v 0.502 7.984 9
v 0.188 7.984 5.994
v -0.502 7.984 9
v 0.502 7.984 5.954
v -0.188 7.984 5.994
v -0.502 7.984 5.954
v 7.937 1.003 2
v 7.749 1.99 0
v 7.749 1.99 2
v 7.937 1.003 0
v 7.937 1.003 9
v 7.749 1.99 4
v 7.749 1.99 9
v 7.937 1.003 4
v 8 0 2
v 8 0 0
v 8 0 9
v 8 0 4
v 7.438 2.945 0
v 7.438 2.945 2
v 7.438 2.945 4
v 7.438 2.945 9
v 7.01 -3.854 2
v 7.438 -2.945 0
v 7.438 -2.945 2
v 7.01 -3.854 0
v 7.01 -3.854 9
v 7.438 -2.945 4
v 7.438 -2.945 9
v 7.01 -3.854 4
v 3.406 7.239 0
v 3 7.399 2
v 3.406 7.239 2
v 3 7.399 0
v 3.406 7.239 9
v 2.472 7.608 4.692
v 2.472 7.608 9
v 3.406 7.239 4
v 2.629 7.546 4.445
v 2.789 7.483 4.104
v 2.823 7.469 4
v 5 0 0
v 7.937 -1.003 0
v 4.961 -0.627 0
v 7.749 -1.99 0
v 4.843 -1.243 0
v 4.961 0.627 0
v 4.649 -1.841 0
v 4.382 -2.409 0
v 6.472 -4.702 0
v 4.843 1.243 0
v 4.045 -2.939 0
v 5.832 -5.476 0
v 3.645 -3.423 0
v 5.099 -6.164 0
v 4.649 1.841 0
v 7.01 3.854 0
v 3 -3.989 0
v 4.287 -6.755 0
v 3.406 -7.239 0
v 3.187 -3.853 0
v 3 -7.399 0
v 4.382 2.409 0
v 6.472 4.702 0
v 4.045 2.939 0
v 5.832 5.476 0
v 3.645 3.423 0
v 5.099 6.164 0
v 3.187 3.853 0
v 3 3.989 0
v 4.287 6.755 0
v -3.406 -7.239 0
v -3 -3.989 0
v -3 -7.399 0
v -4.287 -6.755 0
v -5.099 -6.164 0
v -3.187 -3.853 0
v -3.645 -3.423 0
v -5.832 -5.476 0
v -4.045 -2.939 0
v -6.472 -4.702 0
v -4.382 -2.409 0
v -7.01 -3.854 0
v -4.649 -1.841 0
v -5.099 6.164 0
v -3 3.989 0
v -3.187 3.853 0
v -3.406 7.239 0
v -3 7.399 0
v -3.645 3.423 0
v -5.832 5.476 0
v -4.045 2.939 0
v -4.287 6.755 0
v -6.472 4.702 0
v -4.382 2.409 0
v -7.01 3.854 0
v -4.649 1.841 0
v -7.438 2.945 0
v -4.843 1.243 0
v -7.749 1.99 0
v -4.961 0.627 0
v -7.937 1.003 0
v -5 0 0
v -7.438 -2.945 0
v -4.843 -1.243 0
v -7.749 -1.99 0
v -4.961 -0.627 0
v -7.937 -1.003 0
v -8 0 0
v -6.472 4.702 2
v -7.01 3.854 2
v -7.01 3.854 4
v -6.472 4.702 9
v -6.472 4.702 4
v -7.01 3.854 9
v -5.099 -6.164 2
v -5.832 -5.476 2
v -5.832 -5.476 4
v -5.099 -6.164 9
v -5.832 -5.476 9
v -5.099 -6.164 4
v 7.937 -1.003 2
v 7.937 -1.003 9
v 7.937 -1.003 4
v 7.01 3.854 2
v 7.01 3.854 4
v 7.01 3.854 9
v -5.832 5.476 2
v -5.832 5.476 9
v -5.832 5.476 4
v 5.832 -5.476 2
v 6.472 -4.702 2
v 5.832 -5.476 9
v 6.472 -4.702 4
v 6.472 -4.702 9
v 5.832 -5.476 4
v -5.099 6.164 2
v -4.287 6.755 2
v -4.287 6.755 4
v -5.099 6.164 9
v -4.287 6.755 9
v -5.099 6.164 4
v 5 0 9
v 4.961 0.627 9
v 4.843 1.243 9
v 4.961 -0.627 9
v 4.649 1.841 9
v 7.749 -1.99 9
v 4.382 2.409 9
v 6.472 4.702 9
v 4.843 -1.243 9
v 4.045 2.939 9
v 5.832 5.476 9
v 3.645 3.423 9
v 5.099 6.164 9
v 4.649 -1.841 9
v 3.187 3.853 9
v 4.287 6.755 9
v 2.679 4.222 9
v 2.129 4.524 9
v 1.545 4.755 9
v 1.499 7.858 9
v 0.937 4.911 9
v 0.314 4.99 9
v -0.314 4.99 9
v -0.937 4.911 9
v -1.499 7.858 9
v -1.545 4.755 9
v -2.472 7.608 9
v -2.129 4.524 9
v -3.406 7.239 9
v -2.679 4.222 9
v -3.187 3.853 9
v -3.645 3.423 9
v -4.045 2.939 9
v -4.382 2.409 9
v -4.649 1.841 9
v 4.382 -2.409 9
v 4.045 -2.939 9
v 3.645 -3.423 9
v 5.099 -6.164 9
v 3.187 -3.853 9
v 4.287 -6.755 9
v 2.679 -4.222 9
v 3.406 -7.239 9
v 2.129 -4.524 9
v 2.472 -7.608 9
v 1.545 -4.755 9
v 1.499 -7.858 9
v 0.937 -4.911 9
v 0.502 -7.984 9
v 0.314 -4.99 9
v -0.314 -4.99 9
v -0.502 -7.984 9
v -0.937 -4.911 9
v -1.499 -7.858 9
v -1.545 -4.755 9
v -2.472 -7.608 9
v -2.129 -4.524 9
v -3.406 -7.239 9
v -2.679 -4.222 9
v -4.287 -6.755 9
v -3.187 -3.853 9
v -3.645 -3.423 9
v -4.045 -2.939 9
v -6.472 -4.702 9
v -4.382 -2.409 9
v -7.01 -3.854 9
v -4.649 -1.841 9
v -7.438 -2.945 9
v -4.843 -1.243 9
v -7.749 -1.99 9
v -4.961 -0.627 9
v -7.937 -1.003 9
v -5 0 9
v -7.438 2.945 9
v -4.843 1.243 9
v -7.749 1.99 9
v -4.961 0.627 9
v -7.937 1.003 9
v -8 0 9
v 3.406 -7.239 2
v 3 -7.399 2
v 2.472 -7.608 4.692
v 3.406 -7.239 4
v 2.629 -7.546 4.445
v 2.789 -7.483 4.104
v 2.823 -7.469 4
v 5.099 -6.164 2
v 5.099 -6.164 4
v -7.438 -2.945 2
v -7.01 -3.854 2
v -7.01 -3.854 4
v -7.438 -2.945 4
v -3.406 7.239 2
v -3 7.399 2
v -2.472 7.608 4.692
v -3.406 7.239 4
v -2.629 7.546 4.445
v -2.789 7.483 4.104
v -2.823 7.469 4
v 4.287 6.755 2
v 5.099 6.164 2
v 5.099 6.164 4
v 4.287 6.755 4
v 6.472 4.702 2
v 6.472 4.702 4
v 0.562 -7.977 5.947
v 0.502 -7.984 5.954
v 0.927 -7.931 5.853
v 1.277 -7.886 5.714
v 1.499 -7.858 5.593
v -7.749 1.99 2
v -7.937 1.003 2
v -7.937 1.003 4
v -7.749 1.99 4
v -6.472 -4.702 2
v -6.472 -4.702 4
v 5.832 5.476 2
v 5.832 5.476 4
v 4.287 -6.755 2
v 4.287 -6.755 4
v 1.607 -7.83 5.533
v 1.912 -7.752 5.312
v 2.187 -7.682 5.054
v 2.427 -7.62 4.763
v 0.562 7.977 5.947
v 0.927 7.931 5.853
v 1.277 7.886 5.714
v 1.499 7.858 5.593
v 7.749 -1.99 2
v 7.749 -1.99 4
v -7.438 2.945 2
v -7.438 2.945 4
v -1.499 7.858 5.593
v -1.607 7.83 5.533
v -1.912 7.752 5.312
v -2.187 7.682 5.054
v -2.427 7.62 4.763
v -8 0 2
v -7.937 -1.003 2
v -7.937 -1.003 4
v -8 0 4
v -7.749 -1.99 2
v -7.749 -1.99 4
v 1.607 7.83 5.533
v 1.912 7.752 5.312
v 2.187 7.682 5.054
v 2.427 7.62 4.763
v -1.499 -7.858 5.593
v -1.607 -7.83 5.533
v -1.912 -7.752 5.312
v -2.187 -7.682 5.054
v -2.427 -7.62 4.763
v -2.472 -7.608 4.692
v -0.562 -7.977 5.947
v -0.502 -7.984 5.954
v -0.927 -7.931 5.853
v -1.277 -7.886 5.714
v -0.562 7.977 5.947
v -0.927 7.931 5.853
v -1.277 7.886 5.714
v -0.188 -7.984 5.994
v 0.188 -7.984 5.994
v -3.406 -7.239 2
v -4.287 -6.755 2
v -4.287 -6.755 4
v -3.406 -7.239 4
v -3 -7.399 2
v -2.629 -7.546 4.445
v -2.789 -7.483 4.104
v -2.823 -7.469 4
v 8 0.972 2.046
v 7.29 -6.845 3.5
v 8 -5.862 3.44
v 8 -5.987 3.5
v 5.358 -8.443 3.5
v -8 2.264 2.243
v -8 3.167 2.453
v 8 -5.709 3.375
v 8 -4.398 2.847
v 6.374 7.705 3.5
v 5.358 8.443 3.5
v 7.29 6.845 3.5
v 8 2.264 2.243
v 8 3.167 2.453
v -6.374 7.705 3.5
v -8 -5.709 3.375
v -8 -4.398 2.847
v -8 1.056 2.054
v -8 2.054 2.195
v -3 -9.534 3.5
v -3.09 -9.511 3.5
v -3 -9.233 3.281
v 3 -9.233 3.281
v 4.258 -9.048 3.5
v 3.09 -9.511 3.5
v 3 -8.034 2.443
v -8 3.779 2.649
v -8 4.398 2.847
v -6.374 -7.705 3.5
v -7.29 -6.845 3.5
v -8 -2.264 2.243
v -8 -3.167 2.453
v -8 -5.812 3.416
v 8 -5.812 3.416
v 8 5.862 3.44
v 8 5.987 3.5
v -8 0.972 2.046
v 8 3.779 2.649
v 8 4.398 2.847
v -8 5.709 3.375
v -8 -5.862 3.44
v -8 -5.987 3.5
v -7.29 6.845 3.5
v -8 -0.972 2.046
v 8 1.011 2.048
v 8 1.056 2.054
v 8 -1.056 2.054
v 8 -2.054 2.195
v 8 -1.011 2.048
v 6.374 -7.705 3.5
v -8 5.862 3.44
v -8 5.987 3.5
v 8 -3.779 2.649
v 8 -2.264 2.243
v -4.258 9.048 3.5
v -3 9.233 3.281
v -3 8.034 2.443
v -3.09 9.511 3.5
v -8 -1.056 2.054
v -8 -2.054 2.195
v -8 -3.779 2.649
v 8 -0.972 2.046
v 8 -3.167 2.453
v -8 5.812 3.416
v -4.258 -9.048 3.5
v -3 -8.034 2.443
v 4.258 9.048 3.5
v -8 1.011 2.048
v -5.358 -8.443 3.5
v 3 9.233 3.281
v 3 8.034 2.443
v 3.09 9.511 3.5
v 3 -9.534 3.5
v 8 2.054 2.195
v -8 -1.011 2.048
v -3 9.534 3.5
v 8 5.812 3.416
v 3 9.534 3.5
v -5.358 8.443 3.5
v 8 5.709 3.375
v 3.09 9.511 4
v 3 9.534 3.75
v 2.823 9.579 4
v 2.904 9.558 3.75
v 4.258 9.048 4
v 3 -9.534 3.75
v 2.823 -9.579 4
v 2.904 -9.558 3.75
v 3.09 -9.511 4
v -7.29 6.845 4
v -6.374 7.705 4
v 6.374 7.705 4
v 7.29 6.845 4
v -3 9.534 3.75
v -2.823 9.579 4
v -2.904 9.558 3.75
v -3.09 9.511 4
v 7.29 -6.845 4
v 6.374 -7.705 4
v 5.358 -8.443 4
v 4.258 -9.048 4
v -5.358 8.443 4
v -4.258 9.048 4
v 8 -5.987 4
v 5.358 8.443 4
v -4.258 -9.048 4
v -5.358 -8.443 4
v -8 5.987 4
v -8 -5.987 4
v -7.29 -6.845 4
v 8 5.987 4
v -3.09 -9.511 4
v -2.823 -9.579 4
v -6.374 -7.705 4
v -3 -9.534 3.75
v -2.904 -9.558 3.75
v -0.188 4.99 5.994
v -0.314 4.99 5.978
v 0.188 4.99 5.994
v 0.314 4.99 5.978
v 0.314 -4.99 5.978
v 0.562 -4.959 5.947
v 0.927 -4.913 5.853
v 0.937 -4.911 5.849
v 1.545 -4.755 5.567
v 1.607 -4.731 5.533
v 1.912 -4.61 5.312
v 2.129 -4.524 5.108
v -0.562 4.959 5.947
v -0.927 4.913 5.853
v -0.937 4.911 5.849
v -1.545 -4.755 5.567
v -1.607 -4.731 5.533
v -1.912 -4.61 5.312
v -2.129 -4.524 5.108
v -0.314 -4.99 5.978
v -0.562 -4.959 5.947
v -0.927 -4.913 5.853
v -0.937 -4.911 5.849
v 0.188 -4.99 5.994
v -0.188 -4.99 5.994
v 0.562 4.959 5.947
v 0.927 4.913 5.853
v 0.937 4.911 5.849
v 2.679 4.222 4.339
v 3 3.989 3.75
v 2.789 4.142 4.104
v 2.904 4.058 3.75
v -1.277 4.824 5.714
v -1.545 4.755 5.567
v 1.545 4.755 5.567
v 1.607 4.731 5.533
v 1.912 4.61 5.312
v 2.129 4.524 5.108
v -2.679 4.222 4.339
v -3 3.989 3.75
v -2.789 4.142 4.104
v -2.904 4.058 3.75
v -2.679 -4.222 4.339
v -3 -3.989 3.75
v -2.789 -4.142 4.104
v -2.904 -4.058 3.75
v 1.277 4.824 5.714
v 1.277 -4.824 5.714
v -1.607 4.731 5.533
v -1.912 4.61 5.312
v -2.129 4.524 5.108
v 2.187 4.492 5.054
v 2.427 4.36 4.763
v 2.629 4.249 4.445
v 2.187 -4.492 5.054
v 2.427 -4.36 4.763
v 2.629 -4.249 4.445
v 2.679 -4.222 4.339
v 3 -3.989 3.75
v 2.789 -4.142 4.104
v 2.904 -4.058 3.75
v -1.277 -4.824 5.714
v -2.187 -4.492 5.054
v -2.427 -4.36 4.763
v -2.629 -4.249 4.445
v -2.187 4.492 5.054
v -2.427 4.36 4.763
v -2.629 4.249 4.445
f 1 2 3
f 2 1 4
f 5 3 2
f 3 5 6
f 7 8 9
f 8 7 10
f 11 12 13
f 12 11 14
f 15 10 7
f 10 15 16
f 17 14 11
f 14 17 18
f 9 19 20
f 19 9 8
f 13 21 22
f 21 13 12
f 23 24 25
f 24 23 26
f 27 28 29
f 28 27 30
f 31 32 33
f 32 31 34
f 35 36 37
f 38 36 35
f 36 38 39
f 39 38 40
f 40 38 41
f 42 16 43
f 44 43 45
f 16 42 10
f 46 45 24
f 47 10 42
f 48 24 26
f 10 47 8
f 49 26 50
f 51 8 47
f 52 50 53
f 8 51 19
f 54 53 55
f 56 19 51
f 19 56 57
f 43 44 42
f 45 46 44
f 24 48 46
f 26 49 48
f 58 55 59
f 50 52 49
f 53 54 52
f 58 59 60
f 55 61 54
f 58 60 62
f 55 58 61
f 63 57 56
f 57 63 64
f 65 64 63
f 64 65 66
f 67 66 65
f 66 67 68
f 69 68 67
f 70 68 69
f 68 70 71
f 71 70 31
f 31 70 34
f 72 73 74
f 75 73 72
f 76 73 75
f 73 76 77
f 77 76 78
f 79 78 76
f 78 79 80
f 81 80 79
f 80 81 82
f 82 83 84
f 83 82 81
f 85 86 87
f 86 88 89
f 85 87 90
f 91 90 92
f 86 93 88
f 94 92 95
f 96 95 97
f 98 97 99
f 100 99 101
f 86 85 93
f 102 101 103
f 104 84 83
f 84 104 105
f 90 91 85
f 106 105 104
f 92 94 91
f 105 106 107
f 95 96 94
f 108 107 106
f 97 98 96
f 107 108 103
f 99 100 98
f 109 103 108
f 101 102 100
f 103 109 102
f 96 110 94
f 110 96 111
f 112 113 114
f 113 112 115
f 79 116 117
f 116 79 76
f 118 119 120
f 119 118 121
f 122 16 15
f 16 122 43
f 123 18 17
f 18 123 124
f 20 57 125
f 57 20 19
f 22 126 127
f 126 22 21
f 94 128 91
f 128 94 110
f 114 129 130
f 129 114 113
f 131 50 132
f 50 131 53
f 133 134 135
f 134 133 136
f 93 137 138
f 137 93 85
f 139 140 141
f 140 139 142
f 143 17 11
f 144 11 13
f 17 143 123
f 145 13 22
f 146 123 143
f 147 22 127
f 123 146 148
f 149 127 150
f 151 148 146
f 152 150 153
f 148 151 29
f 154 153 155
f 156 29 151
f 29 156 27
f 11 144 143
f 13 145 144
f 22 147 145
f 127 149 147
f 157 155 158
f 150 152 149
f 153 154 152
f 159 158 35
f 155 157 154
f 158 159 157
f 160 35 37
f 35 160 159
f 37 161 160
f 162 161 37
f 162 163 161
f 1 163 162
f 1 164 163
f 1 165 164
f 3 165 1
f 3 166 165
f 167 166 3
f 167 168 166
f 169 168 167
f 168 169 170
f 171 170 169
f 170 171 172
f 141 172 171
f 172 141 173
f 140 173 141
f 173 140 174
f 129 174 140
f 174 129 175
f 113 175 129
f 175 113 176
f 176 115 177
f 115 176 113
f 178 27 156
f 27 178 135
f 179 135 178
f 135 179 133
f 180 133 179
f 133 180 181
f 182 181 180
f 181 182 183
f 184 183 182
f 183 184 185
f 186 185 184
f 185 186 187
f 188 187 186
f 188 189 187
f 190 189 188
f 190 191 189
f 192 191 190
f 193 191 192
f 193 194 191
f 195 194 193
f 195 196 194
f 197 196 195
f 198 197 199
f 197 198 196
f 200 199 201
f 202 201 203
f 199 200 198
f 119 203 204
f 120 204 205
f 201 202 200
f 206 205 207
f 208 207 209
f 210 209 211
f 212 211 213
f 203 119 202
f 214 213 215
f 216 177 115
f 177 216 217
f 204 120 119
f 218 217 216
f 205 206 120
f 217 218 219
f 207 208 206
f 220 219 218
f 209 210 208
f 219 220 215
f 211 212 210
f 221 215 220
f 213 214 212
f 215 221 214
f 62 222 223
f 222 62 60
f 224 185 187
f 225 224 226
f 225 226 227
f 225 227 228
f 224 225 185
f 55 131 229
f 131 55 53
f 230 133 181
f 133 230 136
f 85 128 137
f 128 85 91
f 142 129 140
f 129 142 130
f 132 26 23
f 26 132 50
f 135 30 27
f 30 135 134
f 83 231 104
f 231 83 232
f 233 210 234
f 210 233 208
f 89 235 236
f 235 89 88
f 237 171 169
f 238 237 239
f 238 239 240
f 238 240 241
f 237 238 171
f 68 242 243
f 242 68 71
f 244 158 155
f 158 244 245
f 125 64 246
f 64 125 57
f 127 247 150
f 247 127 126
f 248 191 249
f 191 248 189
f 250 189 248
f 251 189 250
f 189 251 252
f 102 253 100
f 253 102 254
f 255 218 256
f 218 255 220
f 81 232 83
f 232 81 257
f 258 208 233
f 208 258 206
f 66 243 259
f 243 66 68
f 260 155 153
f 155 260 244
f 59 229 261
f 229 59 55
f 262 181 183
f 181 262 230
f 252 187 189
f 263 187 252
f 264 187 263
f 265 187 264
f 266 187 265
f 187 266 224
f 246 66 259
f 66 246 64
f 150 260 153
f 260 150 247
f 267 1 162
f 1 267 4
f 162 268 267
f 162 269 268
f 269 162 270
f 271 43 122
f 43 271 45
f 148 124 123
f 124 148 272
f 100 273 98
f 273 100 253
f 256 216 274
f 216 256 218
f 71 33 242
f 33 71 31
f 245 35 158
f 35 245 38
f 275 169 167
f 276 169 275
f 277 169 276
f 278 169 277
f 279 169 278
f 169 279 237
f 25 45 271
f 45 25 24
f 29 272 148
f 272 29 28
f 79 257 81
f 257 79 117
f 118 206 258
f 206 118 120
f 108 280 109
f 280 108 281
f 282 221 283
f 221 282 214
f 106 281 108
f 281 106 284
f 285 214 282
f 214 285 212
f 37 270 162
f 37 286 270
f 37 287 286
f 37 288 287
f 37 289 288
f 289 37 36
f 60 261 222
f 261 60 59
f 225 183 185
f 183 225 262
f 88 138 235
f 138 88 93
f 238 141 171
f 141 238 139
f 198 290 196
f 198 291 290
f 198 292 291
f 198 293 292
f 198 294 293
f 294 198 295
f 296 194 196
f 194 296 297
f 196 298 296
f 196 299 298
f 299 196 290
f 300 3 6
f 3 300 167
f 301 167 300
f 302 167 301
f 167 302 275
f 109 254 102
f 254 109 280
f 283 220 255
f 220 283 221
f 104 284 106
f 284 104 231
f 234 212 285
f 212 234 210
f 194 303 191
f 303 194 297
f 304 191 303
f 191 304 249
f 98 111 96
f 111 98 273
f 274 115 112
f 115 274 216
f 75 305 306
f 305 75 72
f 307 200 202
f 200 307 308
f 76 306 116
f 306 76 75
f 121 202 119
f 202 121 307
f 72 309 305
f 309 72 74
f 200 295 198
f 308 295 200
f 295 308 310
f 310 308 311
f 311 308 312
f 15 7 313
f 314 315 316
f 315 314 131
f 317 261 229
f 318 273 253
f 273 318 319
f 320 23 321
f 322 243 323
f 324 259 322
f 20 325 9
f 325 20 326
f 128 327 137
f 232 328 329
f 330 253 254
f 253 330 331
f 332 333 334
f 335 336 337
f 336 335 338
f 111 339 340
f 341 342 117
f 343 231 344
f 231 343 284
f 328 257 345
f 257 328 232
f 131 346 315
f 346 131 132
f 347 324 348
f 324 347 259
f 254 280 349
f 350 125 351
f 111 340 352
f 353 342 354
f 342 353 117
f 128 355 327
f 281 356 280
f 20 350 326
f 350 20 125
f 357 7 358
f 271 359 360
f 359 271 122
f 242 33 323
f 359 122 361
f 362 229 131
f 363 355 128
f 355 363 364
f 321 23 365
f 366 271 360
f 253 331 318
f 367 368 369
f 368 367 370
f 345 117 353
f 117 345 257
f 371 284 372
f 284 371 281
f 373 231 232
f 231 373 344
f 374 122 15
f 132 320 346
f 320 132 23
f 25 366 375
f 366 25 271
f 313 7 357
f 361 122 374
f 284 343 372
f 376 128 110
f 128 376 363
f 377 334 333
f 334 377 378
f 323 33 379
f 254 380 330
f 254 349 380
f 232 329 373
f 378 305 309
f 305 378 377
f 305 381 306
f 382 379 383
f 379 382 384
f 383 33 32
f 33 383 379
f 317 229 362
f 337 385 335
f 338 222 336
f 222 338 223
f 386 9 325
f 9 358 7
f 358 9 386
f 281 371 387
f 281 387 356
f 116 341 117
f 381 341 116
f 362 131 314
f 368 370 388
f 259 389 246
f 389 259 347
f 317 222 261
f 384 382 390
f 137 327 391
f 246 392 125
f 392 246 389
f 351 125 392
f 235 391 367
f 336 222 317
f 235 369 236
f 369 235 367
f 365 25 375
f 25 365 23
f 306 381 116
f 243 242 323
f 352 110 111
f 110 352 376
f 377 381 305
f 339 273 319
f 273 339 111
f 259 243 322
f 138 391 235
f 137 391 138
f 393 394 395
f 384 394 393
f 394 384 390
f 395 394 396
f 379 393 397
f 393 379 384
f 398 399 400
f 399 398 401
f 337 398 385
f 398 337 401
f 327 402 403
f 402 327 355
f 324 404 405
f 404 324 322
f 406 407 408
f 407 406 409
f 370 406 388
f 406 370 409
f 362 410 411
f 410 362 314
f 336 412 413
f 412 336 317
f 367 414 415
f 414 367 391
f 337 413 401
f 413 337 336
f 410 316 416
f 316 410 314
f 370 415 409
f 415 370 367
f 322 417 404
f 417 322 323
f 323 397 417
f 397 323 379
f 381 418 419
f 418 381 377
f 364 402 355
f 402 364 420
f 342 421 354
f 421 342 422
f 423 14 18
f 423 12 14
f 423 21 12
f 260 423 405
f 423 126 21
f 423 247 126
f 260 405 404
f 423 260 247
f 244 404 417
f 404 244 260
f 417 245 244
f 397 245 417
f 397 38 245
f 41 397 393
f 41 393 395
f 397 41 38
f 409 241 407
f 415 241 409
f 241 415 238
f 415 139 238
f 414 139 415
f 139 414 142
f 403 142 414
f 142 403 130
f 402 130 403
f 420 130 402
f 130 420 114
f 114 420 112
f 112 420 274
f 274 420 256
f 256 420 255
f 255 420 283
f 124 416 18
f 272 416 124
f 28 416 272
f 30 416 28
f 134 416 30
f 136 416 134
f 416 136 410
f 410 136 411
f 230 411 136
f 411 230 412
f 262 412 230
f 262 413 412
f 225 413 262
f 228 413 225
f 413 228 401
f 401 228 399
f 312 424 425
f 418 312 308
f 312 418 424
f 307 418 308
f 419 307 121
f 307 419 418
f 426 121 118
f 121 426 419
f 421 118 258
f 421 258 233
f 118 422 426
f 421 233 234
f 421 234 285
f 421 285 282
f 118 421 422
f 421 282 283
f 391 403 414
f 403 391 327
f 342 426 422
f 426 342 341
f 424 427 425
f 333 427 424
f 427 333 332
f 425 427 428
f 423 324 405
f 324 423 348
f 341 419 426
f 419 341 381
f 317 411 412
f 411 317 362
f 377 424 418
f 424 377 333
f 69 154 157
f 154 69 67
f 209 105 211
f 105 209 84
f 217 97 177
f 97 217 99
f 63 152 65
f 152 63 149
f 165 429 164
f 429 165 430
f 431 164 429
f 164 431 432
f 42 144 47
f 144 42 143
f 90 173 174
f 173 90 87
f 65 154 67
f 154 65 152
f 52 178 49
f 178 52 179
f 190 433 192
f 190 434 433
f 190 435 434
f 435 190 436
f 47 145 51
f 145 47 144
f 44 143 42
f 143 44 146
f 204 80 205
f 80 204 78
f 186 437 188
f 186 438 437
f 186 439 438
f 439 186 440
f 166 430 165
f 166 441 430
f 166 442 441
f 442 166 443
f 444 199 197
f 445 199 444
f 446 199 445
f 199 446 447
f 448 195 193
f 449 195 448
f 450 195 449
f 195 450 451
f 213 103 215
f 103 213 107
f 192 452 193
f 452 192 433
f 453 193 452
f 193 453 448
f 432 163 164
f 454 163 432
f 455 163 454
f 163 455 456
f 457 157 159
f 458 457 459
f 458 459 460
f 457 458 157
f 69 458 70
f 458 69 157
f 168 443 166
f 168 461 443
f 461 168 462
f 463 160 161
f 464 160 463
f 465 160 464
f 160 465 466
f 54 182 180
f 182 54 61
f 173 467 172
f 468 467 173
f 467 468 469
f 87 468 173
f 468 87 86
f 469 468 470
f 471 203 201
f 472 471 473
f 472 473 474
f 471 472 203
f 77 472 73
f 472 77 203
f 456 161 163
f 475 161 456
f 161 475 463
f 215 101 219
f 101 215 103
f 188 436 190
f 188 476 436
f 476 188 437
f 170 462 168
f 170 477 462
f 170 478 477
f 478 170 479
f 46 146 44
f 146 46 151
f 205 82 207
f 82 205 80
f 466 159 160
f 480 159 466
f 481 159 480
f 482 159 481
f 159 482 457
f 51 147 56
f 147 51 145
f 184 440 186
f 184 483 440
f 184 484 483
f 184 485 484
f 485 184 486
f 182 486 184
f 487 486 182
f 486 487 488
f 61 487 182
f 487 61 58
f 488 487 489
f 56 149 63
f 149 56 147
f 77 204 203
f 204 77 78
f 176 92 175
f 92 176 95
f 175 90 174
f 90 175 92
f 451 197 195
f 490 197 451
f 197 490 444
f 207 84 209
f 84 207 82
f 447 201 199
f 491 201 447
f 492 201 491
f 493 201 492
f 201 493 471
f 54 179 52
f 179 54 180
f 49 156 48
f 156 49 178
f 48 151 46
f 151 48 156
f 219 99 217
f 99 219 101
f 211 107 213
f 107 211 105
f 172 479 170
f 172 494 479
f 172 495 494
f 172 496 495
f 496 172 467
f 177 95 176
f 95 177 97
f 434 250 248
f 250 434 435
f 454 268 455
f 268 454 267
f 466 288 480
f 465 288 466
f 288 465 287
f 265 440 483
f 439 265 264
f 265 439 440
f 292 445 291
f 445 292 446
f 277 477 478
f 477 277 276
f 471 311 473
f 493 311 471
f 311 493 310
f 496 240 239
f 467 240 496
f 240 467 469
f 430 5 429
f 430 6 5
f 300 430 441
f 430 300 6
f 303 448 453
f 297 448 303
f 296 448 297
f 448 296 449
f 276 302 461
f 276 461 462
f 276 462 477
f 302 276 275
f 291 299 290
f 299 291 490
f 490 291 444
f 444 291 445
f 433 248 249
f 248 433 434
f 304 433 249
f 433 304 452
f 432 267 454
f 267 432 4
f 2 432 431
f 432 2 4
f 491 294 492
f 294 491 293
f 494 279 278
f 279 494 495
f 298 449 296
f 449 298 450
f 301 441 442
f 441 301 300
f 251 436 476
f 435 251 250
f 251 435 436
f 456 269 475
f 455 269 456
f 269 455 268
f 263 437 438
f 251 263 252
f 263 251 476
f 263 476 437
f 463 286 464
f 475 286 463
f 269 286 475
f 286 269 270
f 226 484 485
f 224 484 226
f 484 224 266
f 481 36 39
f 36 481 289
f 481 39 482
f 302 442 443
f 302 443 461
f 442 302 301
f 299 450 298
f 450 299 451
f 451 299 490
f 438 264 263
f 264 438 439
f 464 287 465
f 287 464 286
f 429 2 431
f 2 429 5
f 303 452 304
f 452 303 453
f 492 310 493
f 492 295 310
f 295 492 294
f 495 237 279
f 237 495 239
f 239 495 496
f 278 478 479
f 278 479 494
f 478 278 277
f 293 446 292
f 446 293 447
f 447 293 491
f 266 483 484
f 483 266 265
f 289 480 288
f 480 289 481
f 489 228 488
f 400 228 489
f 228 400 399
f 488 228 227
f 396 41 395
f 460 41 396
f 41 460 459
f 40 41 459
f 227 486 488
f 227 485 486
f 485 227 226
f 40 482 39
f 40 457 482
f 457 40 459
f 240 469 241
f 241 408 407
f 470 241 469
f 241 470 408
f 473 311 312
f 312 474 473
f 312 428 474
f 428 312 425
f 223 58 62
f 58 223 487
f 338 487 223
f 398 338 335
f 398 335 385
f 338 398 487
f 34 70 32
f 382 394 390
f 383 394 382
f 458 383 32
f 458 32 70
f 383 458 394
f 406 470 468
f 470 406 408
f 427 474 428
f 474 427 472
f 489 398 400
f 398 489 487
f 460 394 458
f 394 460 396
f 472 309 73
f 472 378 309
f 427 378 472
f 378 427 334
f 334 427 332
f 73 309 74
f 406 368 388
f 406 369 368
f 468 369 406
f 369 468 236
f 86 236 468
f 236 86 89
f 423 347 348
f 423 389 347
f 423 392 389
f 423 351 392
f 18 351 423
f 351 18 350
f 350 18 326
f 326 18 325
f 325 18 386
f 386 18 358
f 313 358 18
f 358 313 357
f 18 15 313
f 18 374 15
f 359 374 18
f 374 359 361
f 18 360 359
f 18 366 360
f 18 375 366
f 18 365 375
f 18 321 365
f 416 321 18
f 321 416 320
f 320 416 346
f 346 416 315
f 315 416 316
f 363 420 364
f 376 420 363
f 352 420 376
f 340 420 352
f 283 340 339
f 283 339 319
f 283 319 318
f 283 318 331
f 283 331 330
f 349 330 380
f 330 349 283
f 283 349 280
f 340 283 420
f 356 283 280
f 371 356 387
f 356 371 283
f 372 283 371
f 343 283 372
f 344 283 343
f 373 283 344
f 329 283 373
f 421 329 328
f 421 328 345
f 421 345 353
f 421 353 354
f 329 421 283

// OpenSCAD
eps = 0.05;
eps2 = 2 * eps;
epsz = [0, 0, -eps];

$fn = 50;

d_ring = 16;
d_outer = 20;
h = 9;
h_rim = 2;
z_rim = 2;

d_screw = 6;
screw_y = 6;

d_antenna = 10;
d_antenna_recess = 10;
h_antenna = 3;


difference() {
    union() {
        cylinder(d=d_ring, h=h);
        translate([0, 0, z_rim]) cylinder(d1=d_ring, d2=d_outer, h=1.5);
        translate([0, 0, z_rim+1.5]) cylinder(d=d_outer, h=h_rim-1.5);
    }
    
    translate(epsz) cylinder(d=d_antenna, h=h+eps2);
    translate(epsz) cylinder(d=d_antenna_recess, h=h-h_antenna+eps);

    translate([0, 0, screw_y-(d_screw/2)]) rotate([90, 0, 0]) cylinder(d=d_screw, h=d_outer+eps2, center=true);
    cube([d_screw, d_outer+eps, d_screw+(screw_y-(d_screw/2))/2], center=true);
    
    translate([d_ring/2, -d_outer/2, -eps]) cube([d_outer, d_outer, h+eps2]);
    mirror([1, 0, 0] )translate([d_ring/2, -d_outer/2, -eps]) cube([d_outer, d_outer, h+eps2]);
    
}
